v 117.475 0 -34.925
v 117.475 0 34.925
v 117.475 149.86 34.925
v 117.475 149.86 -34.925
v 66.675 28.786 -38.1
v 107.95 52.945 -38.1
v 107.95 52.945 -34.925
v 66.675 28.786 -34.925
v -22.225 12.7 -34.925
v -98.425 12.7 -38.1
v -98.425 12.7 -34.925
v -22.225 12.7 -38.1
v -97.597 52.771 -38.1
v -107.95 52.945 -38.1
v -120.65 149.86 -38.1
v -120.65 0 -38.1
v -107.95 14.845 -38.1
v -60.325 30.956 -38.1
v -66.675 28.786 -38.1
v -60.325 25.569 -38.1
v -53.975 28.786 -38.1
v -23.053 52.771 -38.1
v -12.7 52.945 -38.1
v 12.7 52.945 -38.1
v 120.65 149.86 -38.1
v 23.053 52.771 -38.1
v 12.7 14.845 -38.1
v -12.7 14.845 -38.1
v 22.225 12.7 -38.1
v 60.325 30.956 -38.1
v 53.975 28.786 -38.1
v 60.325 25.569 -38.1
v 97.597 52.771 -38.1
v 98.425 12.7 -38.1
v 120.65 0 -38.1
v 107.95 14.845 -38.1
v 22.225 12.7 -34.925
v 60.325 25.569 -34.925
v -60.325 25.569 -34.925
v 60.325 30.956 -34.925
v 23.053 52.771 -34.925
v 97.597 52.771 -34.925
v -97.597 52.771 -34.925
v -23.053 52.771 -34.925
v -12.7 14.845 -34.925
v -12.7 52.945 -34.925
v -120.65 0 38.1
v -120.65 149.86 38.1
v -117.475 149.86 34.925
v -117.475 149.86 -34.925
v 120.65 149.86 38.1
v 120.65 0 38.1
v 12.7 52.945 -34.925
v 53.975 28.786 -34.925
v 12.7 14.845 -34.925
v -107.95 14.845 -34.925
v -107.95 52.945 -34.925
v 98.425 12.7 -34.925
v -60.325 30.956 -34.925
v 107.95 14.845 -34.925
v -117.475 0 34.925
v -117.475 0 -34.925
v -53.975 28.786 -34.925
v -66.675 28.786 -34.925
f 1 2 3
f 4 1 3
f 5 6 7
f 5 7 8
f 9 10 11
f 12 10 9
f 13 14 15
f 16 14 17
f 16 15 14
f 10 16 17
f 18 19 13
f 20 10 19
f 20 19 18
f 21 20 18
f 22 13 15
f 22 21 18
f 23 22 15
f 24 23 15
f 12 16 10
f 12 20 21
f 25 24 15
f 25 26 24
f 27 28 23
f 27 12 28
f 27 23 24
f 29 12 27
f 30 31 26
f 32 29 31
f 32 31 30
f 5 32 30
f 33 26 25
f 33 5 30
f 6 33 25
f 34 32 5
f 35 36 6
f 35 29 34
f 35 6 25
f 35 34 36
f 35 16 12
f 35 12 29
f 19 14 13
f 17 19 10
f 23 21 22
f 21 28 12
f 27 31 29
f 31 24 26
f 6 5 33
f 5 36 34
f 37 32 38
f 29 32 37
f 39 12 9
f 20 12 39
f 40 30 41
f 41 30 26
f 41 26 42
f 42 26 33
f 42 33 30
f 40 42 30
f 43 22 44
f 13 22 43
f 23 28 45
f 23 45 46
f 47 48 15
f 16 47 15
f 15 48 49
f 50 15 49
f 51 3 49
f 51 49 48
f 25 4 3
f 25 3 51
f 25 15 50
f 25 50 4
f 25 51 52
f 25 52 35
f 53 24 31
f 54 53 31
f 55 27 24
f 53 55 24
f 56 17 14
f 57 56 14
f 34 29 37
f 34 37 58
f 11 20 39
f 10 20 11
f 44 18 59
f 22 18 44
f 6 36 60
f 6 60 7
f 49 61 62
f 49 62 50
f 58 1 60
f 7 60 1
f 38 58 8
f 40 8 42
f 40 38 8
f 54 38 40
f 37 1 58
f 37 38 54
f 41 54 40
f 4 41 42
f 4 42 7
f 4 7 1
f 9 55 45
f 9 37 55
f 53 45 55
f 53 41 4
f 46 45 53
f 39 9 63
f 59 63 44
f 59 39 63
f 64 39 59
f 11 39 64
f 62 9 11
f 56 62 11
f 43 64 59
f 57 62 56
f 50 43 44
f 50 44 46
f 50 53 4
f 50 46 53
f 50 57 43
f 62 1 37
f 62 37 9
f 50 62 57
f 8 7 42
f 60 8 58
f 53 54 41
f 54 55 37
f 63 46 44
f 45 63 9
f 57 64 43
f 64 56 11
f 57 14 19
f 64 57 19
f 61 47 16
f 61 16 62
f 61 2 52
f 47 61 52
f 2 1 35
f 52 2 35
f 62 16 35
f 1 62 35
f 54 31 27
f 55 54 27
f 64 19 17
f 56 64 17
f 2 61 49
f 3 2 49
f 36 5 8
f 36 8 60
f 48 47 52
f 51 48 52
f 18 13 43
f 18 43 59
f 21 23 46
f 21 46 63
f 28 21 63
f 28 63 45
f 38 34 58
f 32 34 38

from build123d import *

# Parameters (mm, degrees)
SKETCH1_W           = 241.3
SKETCH1_H           = 76.2
SKETCH1_W_2         = 205.74
SKETCH1_H_2         = 5.588
BOSS_EXTRUDE1_DEPTH = 149.86
SHELL1_T            = -3.175
CUT_EXTRUDE1_REACH  = 281.957
CUT_EXTRUDE1_START  = -73.025


with BuildPart() as part:
    # Sketch1 → Boss-Extrude1 (new body)
    with BuildSketch(Plane(origin=(0, 0, 0), x_dir=(1, 0, 0), z_dir=(0, 1, 0))):
        Rectangle(SKETCH1_W, SKETCH1_H)
        Rectangle(SKETCH1_W_2, SKETCH1_H_2, mode=Mode.SUBTRACT)
    extrude(amount=BOSS_EXTRUDE1_DEPTH)

    # Shell1
    shell1_openings = [part.faces().sort_by_distance(p)[0] for p in [
        (0, 0, -35.569542927),
        (0, 74.93, -2.794),
        (0, 74.93, 2.794),
        (-102.87, 74.93, 0),
        (102.87, 74.93, 0),
        (0, 149.86, -35.569542927),
    ]]
    offset(amount=SHELL1_T, openings=shell1_openings, kind=Kind.INTERSECTION)

    # Sketch3 → Cut-Extrude1 (cut, up to next)
    with BuildSketch(Plane.XY.offset(38.1).offset(CUT_EXTRUDE1_START), mode=Mode.PRIVATE) as cut_extrude1_sk1:
        Polygon((107.95, 52.944691481), (66.675, 28.786196813), (107.95, 14.844691481), align=None)
    cut_extrude1_tool1 = extrude(cut_extrude1_sk1.sketch, amount=-CUT_EXTRUDE1_REACH, mode=Mode.PRIVATE) & part.part
    # Sketch3 → Cut-Extrude1 (cut, up to next)
    with BuildSketch(Plane.XY.offset(38.1).offset(CUT_EXTRUDE1_START), mode=Mode.PRIVATE) as cut_extrude1_sk2:
        Polygon((98.425, 12.7), (60.325, 25.569081846), (22.225, 12.7), align=None)
    cut_extrude1_tool2 = extrude(cut_extrude1_sk2.sketch, amount=-CUT_EXTRUDE1_REACH, mode=Mode.PRIVATE) & part.part
    # Sketch3 → Cut-Extrude1 (cut, up to next)
    with BuildSketch(Plane.XY.offset(38.1).offset(CUT_EXTRUDE1_START), mode=Mode.PRIVATE) as cut_extrude1_sk3:
        Polygon((97.597199346, 52.771327471), (60.325, 30.955695027), (23.052800654, 52.771327471), align=None)
    cut_extrude1_tool3 = extrude(cut_extrude1_sk3.sketch, amount=-CUT_EXTRUDE1_REACH, mode=Mode.PRIVATE) & part.part
    # Sketch3 → Cut-Extrude1 (cut, up to next)
    with BuildSketch(Plane.XY.offset(38.1).offset(CUT_EXTRUDE1_START), mode=Mode.PRIVATE) as cut_extrude1_sk4:
        Polygon((53.975, 28.786196813), (12.7, 14.844691481), (12.7, 52.944691481), align=None)
    cut_extrude1_tool4 = extrude(cut_extrude1_sk4.sketch, amount=-CUT_EXTRUDE1_REACH, mode=Mode.PRIVATE) & part.part
    # Sketch3 → Cut-Extrude1 (cut, up to next)
    with BuildSketch(Plane.XY.offset(38.1).offset(CUT_EXTRUDE1_START), mode=Mode.PRIVATE) as cut_extrude1_sk5:
        Polygon((-107.95, 52.944691481), (-66.675, 28.786196813), (-107.95, 14.844691481), align=None)
    cut_extrude1_tool5 = extrude(cut_extrude1_sk5.sketch, amount=-CUT_EXTRUDE1_REACH, mode=Mode.PRIVATE) & part.part
    # Sketch3 → Cut-Extrude1 (cut, up to next)
    with BuildSketch(Plane.XY.offset(38.1).offset(CUT_EXTRUDE1_START), mode=Mode.PRIVATE) as cut_extrude1_sk6:
        Polygon((-22.225, 12.7), (-60.325, 25.569081846), (-98.425, 12.7), align=None)
    cut_extrude1_tool6 = extrude(cut_extrude1_sk6.sketch, amount=-CUT_EXTRUDE1_REACH, mode=Mode.PRIVATE) & part.part
    # Sketch3 → Cut-Extrude1 (cut, up to next)
    with BuildSketch(Plane.XY.offset(38.1).offset(CUT_EXTRUDE1_START), mode=Mode.PRIVATE) as cut_extrude1_sk7:
        Polygon((-12.7, 52.944691481), (-53.975, 28.786196813), (-12.7, 14.844691481), align=None)
    cut_extrude1_tool7 = extrude(cut_extrude1_sk7.sketch, amount=-CUT_EXTRUDE1_REACH, mode=Mode.PRIVATE) & part.part
    # Sketch3 → Cut-Extrude1 (cut, up to next)
    with BuildSketch(Plane.XY.offset(38.1).offset(CUT_EXTRUDE1_START), mode=Mode.PRIVATE) as cut_extrude1_sk8:
        Polygon((-97.597199346, 52.771327471), (-60.325, 30.955695027), (-23.052800654, 52.771327471), align=None)
    cut_extrude1_tool8 = extrude(cut_extrude1_sk8.sketch, amount=-CUT_EXTRUDE1_REACH, mode=Mode.PRIVATE) & part.part
    add(cut_extrude1_tool1.solids().sort_by_distance((94.191667, 32.19186, -34.925))[0], mode=Mode.SUBTRACT)
    add(cut_extrude1_tool2.solids().sort_by_distance((60.325, 16.989694, -34.925))[0], mode=Mode.SUBTRACT)
    add(cut_extrude1_tool3.solids().sort_by_distance((60.325, 45.49945, -34.925))[0], mode=Mode.SUBTRACT)
    add(cut_extrude1_tool4.solids().sort_by_distance((26.458333, 32.19186, -34.925))[0], mode=Mode.SUBTRACT)
    add(cut_extrude1_tool5.solids().sort_by_distance((-94.191667, 32.19186, -34.925))[0], mode=Mode.SUBTRACT)
    add(cut_extrude1_tool6.solids().sort_by_distance((-60.325, 16.989694, -34.925))[0], mode=Mode.SUBTRACT)
    add(cut_extrude1_tool7.solids().sort_by_distance((-26.458333, 32.19186, -34.925))[0], mode=Mode.SUBTRACT)
    add(cut_extrude1_tool8.solids().sort_by_distance((-60.325, 45.49945, -34.925))[0], mode=Mode.SUBTRACT)


solid = part.part
